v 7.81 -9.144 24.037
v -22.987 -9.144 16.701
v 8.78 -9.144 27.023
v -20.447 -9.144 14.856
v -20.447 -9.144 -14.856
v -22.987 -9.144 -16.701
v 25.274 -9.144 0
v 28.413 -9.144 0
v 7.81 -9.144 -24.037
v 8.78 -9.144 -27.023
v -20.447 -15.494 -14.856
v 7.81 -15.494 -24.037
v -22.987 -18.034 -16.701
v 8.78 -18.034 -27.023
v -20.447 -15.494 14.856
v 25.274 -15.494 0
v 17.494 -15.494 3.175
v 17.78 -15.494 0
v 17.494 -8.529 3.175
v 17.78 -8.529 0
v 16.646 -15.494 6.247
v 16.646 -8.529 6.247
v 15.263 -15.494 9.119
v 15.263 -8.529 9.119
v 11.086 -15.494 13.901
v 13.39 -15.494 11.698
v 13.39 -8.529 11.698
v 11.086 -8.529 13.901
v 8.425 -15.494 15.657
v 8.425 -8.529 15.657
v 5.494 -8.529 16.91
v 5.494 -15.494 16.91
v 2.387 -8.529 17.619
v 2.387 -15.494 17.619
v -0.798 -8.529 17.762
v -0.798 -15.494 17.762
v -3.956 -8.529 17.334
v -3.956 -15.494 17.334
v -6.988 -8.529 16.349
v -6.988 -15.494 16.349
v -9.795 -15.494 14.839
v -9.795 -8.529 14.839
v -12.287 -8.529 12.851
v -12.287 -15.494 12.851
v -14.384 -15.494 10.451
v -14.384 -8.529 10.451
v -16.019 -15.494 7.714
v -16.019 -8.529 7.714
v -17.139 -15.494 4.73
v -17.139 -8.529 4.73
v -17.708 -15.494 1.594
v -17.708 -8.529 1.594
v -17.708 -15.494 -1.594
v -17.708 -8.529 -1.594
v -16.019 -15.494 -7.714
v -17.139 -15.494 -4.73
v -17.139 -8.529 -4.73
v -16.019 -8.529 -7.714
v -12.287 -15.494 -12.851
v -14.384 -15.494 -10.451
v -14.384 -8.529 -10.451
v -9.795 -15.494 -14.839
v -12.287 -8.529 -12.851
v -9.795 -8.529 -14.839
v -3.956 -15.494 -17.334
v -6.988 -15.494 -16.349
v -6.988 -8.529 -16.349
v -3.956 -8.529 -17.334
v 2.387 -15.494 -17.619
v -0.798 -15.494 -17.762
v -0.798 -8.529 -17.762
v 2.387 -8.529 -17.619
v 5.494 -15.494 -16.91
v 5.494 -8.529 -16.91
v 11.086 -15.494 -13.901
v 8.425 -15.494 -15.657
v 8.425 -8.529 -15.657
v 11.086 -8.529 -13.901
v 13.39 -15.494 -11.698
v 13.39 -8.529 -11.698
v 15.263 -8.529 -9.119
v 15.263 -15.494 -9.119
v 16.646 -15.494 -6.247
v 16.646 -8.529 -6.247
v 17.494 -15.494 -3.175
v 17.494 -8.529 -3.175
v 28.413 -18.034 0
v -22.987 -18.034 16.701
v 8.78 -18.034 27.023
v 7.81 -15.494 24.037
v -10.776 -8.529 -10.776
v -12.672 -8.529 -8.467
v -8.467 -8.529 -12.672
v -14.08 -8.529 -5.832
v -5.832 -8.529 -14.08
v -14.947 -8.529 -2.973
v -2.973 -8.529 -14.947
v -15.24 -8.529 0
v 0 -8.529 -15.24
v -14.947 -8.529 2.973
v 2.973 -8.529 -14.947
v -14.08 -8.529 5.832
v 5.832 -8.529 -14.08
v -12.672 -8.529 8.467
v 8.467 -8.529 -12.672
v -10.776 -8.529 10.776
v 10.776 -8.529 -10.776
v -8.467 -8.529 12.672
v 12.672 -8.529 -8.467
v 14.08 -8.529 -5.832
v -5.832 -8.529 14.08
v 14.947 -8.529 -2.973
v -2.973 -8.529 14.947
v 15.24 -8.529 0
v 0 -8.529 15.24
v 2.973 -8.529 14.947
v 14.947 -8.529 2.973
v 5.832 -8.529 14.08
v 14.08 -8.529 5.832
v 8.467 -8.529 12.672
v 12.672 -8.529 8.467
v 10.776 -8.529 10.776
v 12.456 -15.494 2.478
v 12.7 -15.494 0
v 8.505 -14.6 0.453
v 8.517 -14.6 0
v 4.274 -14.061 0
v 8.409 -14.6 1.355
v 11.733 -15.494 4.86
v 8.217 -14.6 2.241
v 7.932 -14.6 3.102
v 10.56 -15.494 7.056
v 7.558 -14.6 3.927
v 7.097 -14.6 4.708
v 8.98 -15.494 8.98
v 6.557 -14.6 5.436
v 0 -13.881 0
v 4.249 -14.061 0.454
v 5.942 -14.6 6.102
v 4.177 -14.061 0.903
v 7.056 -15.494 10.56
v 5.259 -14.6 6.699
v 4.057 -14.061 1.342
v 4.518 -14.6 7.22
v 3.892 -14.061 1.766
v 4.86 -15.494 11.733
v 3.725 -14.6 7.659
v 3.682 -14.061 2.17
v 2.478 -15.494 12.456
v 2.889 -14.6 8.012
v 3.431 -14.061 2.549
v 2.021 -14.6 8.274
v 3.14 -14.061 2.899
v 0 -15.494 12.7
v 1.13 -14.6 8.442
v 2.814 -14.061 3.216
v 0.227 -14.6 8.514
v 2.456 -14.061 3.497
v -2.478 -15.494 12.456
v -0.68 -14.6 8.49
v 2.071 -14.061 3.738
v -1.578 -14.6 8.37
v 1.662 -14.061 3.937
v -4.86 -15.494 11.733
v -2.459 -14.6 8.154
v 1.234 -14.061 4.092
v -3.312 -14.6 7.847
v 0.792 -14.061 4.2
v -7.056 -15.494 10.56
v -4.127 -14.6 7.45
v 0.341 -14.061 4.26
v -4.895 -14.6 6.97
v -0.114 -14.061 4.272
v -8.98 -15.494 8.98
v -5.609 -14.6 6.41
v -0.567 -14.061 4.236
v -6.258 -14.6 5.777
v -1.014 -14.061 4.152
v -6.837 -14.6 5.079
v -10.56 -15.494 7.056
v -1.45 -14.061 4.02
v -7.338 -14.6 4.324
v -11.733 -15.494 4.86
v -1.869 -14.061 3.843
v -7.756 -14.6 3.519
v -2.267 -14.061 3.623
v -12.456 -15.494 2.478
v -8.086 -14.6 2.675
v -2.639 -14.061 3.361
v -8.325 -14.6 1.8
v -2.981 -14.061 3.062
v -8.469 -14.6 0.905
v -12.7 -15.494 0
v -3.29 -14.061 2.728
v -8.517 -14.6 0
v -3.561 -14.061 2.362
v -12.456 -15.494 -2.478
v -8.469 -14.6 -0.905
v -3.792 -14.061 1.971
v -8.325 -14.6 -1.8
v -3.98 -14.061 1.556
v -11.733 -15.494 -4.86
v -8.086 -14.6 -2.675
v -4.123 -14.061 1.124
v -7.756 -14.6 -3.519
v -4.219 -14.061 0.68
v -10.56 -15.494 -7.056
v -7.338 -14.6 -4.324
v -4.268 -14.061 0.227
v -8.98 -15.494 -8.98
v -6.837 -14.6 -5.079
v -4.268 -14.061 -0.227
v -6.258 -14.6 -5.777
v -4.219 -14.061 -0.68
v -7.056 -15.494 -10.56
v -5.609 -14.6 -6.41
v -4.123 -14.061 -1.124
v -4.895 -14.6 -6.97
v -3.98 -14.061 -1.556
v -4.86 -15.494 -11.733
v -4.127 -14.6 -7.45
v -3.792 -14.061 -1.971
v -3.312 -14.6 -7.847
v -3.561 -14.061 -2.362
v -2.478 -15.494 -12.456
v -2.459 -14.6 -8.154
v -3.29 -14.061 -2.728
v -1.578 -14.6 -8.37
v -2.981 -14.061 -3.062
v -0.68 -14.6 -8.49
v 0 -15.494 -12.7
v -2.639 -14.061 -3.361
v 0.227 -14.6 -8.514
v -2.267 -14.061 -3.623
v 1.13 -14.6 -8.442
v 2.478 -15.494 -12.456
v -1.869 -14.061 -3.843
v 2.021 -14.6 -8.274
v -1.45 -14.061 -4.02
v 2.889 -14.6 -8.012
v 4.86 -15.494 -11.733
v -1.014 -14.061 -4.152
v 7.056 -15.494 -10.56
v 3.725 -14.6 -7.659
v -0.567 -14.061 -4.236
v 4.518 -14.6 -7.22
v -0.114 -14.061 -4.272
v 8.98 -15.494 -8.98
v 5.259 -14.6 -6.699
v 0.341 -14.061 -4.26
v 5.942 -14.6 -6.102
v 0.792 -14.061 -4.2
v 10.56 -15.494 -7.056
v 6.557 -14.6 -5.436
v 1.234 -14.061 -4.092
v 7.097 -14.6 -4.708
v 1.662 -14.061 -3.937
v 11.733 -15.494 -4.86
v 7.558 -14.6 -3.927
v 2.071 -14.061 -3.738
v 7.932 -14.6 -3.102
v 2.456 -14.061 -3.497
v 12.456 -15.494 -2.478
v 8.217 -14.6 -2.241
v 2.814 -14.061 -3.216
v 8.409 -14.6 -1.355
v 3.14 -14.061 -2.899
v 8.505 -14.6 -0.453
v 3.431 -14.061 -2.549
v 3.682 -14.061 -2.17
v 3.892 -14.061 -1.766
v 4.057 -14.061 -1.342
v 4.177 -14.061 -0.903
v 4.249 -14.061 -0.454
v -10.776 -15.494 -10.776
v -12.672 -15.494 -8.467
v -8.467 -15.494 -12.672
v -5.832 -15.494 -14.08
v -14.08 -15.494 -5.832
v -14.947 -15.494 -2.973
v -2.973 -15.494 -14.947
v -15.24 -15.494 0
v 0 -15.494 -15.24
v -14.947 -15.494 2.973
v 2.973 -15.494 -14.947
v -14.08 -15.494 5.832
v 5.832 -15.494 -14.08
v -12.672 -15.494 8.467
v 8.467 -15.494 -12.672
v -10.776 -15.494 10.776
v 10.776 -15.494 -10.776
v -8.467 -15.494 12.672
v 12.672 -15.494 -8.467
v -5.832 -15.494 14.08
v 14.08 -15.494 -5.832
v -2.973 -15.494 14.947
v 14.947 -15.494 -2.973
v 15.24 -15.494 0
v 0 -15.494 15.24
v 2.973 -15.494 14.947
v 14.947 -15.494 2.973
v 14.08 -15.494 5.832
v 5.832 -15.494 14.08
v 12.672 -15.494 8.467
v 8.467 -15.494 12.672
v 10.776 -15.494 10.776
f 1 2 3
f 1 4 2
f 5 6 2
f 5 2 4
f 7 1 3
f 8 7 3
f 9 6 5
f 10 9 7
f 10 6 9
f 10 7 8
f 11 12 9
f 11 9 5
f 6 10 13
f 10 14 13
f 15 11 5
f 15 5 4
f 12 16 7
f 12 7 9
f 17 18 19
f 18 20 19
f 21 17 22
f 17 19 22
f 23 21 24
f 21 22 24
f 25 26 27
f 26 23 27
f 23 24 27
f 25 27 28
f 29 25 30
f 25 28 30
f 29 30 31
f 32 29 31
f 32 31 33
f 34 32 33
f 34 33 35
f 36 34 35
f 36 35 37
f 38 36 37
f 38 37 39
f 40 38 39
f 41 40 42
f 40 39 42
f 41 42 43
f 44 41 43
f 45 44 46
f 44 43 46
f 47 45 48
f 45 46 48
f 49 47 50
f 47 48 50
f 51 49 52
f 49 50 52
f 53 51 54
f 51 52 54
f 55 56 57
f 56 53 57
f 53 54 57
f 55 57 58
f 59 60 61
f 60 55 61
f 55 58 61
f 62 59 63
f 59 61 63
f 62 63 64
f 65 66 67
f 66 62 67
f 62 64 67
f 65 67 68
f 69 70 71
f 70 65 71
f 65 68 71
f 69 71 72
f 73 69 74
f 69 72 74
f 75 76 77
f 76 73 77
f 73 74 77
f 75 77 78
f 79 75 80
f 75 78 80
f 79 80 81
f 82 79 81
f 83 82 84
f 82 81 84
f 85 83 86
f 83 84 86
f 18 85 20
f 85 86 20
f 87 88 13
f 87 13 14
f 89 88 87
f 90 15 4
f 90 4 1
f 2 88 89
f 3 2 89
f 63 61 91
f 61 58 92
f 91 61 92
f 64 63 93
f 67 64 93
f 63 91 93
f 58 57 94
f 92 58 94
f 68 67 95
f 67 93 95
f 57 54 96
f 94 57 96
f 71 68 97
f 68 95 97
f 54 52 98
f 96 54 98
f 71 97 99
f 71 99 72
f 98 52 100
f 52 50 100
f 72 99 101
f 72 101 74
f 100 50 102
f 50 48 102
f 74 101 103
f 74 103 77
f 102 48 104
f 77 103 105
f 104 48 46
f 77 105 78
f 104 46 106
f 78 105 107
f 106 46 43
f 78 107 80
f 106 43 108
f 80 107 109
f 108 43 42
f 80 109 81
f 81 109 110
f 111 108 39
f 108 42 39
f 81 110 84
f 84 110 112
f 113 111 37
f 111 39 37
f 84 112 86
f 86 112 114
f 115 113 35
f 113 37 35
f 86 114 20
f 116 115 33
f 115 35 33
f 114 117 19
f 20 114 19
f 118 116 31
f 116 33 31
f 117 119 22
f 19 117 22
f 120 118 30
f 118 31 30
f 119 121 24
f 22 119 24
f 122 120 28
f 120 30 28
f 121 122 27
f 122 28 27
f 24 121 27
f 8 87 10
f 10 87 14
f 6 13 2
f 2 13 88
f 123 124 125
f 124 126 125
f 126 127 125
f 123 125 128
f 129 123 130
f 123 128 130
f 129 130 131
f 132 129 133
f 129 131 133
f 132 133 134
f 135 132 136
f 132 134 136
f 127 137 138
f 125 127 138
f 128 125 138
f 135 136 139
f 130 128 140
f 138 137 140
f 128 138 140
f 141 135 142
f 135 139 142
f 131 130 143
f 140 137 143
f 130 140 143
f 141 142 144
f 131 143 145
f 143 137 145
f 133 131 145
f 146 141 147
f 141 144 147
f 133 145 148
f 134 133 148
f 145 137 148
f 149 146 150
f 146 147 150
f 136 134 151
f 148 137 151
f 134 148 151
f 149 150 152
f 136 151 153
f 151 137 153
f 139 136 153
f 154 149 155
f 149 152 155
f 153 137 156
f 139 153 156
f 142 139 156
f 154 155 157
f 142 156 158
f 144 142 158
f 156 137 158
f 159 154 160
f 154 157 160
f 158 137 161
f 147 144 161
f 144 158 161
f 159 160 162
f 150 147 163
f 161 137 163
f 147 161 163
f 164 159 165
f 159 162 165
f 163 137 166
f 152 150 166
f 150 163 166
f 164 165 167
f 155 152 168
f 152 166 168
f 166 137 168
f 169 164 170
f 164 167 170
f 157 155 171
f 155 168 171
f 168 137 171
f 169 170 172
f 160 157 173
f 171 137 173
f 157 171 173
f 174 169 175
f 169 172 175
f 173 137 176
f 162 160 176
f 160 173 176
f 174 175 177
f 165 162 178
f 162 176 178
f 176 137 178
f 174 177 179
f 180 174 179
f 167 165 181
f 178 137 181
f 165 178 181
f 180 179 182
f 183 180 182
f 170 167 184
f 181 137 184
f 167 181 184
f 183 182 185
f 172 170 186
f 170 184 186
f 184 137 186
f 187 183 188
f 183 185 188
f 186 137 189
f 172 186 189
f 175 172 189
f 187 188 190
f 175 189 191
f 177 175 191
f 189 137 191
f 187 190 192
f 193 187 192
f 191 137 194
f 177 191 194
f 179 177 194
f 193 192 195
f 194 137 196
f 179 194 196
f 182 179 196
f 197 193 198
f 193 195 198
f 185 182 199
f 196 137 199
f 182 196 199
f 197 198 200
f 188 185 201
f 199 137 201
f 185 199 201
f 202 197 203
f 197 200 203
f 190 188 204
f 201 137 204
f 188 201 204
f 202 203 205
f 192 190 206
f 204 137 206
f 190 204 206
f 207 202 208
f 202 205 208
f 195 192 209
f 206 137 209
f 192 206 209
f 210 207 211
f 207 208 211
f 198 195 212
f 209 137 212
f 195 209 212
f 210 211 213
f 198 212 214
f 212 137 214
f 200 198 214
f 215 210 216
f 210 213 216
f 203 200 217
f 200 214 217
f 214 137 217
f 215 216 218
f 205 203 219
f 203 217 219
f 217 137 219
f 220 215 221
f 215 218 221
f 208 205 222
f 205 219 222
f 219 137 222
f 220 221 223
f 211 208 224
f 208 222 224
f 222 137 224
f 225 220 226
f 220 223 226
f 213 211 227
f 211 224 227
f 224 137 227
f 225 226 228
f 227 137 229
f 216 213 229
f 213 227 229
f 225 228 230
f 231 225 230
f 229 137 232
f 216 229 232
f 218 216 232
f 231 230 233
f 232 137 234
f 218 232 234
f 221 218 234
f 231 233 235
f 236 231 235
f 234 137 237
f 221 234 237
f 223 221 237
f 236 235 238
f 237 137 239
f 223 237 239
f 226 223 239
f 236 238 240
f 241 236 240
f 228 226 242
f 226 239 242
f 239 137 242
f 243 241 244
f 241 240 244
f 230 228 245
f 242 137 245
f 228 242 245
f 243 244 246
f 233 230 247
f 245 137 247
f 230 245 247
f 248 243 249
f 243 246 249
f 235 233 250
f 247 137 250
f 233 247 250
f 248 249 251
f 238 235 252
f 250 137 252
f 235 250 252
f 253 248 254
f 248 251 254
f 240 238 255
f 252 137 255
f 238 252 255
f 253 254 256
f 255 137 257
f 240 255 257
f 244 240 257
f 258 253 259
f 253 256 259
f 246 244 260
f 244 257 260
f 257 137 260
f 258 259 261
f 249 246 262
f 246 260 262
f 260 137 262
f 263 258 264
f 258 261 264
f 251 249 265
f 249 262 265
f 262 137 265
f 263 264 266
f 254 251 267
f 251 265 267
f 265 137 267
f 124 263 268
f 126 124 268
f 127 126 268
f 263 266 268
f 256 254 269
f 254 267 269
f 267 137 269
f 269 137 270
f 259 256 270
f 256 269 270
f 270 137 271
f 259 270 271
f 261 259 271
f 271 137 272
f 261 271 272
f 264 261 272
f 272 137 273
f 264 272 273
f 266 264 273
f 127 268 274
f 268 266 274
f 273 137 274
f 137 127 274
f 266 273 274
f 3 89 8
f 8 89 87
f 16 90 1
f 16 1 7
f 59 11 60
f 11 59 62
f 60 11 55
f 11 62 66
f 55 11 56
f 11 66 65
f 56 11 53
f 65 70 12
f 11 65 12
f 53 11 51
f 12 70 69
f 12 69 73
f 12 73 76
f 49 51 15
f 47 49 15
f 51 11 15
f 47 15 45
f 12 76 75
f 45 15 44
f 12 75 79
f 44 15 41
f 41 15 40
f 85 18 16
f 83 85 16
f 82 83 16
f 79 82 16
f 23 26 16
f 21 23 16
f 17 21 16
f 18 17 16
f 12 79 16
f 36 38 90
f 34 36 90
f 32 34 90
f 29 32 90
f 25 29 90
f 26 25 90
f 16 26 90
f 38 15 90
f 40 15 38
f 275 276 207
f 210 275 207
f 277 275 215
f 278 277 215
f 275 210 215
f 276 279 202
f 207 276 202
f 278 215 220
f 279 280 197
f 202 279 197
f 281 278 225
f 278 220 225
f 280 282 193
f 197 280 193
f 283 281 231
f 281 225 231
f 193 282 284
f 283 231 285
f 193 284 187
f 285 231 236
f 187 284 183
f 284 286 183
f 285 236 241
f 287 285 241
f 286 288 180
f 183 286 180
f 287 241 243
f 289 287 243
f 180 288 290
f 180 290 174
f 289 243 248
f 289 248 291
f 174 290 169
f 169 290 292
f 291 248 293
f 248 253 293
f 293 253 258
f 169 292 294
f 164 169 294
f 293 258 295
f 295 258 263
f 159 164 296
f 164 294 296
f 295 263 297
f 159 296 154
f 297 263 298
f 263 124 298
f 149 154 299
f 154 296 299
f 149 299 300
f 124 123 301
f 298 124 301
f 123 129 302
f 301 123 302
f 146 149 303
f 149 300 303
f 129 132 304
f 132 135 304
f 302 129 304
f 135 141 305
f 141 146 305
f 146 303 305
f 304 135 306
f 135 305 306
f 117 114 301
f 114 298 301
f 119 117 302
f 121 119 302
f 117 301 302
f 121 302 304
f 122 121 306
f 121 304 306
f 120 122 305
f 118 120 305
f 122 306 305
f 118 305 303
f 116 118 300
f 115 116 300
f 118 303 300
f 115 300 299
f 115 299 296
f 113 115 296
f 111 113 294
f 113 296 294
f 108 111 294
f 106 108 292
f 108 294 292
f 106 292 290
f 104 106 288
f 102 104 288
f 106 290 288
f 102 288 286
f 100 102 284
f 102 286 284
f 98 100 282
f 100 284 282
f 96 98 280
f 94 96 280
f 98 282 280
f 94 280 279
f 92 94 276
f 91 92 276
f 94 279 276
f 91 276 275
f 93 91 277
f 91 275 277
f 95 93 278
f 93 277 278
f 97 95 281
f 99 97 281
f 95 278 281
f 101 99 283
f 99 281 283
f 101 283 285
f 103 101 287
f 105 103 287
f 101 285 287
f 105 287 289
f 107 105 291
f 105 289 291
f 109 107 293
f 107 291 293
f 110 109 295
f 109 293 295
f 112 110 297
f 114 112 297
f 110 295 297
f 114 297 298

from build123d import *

# Parameters (mm, degrees)
BOSS_EXTRUDE1_DEPTH = 2.54
BOSS_EXTRUDE2_DEPTH = 6.35


with BuildPart() as part:
    # Sketch1 → Revolve1 (revolve)
    with BuildSketch(Plane.XY):
        with BuildLine():
            Line((0, -13.880770422), (0, -18.033881925))
            Line((0, -18.033881925), (17.78, -18.033881925))
            Line((17.78, -18.033881925), (17.78, -8.528719197))
            Line((17.78, -8.528719197), (15.24, -8.528719197))
            Line((15.24, -8.528719197), (15.24, -15.493881925))
            Line((15.24, -15.493881925), (12.7, -15.493881925))
            ThreePointArc((12.7, -15.493881925), (6.401018058, -14.285661851), (0, -13.880770422))
        make_face()
    revolve(axis=Axis((0, -13.880770422, 0), (0, -1, 0)))

    # Sketch2 → Boss-Extrude1 (add)
    with BuildSketch(Plane.XZ.offset(18.033881925)):
        Polygon((28.413494599, 0), (8.780252701, 27.022839189), (-22.987, 16.701033091), (-22.987, -16.701033091), (8.780252701, -27.022839189), align=None)
    extrude(amount=-BOSS_EXTRUDE1_DEPTH)

    # Sketch3 → Boss-Extrude2 (add)
    with BuildSketch(Plane(origin=(0, -15.493881925, 0), x_dir=(1, 0, 0), z_dir=(0, 1, 0))):
        Polygon((28.413494599, 0), (8.780252701, 27.022839189), (-22.987, 16.701033091), (-22.987, -16.701033091), (8.780252701, -27.022839189), align=None)
        Polygon((25.273881936, 0), (7.810059032, 24.036890107), (-20.447, 14.85561507), (-20.447, -14.85561507), (7.810059032, -24.036890107), align=None, mode=Mode.SUBTRACT)
    extrude(amount=BOSS_EXTRUDE2_DEPTH)


solid = part.part
